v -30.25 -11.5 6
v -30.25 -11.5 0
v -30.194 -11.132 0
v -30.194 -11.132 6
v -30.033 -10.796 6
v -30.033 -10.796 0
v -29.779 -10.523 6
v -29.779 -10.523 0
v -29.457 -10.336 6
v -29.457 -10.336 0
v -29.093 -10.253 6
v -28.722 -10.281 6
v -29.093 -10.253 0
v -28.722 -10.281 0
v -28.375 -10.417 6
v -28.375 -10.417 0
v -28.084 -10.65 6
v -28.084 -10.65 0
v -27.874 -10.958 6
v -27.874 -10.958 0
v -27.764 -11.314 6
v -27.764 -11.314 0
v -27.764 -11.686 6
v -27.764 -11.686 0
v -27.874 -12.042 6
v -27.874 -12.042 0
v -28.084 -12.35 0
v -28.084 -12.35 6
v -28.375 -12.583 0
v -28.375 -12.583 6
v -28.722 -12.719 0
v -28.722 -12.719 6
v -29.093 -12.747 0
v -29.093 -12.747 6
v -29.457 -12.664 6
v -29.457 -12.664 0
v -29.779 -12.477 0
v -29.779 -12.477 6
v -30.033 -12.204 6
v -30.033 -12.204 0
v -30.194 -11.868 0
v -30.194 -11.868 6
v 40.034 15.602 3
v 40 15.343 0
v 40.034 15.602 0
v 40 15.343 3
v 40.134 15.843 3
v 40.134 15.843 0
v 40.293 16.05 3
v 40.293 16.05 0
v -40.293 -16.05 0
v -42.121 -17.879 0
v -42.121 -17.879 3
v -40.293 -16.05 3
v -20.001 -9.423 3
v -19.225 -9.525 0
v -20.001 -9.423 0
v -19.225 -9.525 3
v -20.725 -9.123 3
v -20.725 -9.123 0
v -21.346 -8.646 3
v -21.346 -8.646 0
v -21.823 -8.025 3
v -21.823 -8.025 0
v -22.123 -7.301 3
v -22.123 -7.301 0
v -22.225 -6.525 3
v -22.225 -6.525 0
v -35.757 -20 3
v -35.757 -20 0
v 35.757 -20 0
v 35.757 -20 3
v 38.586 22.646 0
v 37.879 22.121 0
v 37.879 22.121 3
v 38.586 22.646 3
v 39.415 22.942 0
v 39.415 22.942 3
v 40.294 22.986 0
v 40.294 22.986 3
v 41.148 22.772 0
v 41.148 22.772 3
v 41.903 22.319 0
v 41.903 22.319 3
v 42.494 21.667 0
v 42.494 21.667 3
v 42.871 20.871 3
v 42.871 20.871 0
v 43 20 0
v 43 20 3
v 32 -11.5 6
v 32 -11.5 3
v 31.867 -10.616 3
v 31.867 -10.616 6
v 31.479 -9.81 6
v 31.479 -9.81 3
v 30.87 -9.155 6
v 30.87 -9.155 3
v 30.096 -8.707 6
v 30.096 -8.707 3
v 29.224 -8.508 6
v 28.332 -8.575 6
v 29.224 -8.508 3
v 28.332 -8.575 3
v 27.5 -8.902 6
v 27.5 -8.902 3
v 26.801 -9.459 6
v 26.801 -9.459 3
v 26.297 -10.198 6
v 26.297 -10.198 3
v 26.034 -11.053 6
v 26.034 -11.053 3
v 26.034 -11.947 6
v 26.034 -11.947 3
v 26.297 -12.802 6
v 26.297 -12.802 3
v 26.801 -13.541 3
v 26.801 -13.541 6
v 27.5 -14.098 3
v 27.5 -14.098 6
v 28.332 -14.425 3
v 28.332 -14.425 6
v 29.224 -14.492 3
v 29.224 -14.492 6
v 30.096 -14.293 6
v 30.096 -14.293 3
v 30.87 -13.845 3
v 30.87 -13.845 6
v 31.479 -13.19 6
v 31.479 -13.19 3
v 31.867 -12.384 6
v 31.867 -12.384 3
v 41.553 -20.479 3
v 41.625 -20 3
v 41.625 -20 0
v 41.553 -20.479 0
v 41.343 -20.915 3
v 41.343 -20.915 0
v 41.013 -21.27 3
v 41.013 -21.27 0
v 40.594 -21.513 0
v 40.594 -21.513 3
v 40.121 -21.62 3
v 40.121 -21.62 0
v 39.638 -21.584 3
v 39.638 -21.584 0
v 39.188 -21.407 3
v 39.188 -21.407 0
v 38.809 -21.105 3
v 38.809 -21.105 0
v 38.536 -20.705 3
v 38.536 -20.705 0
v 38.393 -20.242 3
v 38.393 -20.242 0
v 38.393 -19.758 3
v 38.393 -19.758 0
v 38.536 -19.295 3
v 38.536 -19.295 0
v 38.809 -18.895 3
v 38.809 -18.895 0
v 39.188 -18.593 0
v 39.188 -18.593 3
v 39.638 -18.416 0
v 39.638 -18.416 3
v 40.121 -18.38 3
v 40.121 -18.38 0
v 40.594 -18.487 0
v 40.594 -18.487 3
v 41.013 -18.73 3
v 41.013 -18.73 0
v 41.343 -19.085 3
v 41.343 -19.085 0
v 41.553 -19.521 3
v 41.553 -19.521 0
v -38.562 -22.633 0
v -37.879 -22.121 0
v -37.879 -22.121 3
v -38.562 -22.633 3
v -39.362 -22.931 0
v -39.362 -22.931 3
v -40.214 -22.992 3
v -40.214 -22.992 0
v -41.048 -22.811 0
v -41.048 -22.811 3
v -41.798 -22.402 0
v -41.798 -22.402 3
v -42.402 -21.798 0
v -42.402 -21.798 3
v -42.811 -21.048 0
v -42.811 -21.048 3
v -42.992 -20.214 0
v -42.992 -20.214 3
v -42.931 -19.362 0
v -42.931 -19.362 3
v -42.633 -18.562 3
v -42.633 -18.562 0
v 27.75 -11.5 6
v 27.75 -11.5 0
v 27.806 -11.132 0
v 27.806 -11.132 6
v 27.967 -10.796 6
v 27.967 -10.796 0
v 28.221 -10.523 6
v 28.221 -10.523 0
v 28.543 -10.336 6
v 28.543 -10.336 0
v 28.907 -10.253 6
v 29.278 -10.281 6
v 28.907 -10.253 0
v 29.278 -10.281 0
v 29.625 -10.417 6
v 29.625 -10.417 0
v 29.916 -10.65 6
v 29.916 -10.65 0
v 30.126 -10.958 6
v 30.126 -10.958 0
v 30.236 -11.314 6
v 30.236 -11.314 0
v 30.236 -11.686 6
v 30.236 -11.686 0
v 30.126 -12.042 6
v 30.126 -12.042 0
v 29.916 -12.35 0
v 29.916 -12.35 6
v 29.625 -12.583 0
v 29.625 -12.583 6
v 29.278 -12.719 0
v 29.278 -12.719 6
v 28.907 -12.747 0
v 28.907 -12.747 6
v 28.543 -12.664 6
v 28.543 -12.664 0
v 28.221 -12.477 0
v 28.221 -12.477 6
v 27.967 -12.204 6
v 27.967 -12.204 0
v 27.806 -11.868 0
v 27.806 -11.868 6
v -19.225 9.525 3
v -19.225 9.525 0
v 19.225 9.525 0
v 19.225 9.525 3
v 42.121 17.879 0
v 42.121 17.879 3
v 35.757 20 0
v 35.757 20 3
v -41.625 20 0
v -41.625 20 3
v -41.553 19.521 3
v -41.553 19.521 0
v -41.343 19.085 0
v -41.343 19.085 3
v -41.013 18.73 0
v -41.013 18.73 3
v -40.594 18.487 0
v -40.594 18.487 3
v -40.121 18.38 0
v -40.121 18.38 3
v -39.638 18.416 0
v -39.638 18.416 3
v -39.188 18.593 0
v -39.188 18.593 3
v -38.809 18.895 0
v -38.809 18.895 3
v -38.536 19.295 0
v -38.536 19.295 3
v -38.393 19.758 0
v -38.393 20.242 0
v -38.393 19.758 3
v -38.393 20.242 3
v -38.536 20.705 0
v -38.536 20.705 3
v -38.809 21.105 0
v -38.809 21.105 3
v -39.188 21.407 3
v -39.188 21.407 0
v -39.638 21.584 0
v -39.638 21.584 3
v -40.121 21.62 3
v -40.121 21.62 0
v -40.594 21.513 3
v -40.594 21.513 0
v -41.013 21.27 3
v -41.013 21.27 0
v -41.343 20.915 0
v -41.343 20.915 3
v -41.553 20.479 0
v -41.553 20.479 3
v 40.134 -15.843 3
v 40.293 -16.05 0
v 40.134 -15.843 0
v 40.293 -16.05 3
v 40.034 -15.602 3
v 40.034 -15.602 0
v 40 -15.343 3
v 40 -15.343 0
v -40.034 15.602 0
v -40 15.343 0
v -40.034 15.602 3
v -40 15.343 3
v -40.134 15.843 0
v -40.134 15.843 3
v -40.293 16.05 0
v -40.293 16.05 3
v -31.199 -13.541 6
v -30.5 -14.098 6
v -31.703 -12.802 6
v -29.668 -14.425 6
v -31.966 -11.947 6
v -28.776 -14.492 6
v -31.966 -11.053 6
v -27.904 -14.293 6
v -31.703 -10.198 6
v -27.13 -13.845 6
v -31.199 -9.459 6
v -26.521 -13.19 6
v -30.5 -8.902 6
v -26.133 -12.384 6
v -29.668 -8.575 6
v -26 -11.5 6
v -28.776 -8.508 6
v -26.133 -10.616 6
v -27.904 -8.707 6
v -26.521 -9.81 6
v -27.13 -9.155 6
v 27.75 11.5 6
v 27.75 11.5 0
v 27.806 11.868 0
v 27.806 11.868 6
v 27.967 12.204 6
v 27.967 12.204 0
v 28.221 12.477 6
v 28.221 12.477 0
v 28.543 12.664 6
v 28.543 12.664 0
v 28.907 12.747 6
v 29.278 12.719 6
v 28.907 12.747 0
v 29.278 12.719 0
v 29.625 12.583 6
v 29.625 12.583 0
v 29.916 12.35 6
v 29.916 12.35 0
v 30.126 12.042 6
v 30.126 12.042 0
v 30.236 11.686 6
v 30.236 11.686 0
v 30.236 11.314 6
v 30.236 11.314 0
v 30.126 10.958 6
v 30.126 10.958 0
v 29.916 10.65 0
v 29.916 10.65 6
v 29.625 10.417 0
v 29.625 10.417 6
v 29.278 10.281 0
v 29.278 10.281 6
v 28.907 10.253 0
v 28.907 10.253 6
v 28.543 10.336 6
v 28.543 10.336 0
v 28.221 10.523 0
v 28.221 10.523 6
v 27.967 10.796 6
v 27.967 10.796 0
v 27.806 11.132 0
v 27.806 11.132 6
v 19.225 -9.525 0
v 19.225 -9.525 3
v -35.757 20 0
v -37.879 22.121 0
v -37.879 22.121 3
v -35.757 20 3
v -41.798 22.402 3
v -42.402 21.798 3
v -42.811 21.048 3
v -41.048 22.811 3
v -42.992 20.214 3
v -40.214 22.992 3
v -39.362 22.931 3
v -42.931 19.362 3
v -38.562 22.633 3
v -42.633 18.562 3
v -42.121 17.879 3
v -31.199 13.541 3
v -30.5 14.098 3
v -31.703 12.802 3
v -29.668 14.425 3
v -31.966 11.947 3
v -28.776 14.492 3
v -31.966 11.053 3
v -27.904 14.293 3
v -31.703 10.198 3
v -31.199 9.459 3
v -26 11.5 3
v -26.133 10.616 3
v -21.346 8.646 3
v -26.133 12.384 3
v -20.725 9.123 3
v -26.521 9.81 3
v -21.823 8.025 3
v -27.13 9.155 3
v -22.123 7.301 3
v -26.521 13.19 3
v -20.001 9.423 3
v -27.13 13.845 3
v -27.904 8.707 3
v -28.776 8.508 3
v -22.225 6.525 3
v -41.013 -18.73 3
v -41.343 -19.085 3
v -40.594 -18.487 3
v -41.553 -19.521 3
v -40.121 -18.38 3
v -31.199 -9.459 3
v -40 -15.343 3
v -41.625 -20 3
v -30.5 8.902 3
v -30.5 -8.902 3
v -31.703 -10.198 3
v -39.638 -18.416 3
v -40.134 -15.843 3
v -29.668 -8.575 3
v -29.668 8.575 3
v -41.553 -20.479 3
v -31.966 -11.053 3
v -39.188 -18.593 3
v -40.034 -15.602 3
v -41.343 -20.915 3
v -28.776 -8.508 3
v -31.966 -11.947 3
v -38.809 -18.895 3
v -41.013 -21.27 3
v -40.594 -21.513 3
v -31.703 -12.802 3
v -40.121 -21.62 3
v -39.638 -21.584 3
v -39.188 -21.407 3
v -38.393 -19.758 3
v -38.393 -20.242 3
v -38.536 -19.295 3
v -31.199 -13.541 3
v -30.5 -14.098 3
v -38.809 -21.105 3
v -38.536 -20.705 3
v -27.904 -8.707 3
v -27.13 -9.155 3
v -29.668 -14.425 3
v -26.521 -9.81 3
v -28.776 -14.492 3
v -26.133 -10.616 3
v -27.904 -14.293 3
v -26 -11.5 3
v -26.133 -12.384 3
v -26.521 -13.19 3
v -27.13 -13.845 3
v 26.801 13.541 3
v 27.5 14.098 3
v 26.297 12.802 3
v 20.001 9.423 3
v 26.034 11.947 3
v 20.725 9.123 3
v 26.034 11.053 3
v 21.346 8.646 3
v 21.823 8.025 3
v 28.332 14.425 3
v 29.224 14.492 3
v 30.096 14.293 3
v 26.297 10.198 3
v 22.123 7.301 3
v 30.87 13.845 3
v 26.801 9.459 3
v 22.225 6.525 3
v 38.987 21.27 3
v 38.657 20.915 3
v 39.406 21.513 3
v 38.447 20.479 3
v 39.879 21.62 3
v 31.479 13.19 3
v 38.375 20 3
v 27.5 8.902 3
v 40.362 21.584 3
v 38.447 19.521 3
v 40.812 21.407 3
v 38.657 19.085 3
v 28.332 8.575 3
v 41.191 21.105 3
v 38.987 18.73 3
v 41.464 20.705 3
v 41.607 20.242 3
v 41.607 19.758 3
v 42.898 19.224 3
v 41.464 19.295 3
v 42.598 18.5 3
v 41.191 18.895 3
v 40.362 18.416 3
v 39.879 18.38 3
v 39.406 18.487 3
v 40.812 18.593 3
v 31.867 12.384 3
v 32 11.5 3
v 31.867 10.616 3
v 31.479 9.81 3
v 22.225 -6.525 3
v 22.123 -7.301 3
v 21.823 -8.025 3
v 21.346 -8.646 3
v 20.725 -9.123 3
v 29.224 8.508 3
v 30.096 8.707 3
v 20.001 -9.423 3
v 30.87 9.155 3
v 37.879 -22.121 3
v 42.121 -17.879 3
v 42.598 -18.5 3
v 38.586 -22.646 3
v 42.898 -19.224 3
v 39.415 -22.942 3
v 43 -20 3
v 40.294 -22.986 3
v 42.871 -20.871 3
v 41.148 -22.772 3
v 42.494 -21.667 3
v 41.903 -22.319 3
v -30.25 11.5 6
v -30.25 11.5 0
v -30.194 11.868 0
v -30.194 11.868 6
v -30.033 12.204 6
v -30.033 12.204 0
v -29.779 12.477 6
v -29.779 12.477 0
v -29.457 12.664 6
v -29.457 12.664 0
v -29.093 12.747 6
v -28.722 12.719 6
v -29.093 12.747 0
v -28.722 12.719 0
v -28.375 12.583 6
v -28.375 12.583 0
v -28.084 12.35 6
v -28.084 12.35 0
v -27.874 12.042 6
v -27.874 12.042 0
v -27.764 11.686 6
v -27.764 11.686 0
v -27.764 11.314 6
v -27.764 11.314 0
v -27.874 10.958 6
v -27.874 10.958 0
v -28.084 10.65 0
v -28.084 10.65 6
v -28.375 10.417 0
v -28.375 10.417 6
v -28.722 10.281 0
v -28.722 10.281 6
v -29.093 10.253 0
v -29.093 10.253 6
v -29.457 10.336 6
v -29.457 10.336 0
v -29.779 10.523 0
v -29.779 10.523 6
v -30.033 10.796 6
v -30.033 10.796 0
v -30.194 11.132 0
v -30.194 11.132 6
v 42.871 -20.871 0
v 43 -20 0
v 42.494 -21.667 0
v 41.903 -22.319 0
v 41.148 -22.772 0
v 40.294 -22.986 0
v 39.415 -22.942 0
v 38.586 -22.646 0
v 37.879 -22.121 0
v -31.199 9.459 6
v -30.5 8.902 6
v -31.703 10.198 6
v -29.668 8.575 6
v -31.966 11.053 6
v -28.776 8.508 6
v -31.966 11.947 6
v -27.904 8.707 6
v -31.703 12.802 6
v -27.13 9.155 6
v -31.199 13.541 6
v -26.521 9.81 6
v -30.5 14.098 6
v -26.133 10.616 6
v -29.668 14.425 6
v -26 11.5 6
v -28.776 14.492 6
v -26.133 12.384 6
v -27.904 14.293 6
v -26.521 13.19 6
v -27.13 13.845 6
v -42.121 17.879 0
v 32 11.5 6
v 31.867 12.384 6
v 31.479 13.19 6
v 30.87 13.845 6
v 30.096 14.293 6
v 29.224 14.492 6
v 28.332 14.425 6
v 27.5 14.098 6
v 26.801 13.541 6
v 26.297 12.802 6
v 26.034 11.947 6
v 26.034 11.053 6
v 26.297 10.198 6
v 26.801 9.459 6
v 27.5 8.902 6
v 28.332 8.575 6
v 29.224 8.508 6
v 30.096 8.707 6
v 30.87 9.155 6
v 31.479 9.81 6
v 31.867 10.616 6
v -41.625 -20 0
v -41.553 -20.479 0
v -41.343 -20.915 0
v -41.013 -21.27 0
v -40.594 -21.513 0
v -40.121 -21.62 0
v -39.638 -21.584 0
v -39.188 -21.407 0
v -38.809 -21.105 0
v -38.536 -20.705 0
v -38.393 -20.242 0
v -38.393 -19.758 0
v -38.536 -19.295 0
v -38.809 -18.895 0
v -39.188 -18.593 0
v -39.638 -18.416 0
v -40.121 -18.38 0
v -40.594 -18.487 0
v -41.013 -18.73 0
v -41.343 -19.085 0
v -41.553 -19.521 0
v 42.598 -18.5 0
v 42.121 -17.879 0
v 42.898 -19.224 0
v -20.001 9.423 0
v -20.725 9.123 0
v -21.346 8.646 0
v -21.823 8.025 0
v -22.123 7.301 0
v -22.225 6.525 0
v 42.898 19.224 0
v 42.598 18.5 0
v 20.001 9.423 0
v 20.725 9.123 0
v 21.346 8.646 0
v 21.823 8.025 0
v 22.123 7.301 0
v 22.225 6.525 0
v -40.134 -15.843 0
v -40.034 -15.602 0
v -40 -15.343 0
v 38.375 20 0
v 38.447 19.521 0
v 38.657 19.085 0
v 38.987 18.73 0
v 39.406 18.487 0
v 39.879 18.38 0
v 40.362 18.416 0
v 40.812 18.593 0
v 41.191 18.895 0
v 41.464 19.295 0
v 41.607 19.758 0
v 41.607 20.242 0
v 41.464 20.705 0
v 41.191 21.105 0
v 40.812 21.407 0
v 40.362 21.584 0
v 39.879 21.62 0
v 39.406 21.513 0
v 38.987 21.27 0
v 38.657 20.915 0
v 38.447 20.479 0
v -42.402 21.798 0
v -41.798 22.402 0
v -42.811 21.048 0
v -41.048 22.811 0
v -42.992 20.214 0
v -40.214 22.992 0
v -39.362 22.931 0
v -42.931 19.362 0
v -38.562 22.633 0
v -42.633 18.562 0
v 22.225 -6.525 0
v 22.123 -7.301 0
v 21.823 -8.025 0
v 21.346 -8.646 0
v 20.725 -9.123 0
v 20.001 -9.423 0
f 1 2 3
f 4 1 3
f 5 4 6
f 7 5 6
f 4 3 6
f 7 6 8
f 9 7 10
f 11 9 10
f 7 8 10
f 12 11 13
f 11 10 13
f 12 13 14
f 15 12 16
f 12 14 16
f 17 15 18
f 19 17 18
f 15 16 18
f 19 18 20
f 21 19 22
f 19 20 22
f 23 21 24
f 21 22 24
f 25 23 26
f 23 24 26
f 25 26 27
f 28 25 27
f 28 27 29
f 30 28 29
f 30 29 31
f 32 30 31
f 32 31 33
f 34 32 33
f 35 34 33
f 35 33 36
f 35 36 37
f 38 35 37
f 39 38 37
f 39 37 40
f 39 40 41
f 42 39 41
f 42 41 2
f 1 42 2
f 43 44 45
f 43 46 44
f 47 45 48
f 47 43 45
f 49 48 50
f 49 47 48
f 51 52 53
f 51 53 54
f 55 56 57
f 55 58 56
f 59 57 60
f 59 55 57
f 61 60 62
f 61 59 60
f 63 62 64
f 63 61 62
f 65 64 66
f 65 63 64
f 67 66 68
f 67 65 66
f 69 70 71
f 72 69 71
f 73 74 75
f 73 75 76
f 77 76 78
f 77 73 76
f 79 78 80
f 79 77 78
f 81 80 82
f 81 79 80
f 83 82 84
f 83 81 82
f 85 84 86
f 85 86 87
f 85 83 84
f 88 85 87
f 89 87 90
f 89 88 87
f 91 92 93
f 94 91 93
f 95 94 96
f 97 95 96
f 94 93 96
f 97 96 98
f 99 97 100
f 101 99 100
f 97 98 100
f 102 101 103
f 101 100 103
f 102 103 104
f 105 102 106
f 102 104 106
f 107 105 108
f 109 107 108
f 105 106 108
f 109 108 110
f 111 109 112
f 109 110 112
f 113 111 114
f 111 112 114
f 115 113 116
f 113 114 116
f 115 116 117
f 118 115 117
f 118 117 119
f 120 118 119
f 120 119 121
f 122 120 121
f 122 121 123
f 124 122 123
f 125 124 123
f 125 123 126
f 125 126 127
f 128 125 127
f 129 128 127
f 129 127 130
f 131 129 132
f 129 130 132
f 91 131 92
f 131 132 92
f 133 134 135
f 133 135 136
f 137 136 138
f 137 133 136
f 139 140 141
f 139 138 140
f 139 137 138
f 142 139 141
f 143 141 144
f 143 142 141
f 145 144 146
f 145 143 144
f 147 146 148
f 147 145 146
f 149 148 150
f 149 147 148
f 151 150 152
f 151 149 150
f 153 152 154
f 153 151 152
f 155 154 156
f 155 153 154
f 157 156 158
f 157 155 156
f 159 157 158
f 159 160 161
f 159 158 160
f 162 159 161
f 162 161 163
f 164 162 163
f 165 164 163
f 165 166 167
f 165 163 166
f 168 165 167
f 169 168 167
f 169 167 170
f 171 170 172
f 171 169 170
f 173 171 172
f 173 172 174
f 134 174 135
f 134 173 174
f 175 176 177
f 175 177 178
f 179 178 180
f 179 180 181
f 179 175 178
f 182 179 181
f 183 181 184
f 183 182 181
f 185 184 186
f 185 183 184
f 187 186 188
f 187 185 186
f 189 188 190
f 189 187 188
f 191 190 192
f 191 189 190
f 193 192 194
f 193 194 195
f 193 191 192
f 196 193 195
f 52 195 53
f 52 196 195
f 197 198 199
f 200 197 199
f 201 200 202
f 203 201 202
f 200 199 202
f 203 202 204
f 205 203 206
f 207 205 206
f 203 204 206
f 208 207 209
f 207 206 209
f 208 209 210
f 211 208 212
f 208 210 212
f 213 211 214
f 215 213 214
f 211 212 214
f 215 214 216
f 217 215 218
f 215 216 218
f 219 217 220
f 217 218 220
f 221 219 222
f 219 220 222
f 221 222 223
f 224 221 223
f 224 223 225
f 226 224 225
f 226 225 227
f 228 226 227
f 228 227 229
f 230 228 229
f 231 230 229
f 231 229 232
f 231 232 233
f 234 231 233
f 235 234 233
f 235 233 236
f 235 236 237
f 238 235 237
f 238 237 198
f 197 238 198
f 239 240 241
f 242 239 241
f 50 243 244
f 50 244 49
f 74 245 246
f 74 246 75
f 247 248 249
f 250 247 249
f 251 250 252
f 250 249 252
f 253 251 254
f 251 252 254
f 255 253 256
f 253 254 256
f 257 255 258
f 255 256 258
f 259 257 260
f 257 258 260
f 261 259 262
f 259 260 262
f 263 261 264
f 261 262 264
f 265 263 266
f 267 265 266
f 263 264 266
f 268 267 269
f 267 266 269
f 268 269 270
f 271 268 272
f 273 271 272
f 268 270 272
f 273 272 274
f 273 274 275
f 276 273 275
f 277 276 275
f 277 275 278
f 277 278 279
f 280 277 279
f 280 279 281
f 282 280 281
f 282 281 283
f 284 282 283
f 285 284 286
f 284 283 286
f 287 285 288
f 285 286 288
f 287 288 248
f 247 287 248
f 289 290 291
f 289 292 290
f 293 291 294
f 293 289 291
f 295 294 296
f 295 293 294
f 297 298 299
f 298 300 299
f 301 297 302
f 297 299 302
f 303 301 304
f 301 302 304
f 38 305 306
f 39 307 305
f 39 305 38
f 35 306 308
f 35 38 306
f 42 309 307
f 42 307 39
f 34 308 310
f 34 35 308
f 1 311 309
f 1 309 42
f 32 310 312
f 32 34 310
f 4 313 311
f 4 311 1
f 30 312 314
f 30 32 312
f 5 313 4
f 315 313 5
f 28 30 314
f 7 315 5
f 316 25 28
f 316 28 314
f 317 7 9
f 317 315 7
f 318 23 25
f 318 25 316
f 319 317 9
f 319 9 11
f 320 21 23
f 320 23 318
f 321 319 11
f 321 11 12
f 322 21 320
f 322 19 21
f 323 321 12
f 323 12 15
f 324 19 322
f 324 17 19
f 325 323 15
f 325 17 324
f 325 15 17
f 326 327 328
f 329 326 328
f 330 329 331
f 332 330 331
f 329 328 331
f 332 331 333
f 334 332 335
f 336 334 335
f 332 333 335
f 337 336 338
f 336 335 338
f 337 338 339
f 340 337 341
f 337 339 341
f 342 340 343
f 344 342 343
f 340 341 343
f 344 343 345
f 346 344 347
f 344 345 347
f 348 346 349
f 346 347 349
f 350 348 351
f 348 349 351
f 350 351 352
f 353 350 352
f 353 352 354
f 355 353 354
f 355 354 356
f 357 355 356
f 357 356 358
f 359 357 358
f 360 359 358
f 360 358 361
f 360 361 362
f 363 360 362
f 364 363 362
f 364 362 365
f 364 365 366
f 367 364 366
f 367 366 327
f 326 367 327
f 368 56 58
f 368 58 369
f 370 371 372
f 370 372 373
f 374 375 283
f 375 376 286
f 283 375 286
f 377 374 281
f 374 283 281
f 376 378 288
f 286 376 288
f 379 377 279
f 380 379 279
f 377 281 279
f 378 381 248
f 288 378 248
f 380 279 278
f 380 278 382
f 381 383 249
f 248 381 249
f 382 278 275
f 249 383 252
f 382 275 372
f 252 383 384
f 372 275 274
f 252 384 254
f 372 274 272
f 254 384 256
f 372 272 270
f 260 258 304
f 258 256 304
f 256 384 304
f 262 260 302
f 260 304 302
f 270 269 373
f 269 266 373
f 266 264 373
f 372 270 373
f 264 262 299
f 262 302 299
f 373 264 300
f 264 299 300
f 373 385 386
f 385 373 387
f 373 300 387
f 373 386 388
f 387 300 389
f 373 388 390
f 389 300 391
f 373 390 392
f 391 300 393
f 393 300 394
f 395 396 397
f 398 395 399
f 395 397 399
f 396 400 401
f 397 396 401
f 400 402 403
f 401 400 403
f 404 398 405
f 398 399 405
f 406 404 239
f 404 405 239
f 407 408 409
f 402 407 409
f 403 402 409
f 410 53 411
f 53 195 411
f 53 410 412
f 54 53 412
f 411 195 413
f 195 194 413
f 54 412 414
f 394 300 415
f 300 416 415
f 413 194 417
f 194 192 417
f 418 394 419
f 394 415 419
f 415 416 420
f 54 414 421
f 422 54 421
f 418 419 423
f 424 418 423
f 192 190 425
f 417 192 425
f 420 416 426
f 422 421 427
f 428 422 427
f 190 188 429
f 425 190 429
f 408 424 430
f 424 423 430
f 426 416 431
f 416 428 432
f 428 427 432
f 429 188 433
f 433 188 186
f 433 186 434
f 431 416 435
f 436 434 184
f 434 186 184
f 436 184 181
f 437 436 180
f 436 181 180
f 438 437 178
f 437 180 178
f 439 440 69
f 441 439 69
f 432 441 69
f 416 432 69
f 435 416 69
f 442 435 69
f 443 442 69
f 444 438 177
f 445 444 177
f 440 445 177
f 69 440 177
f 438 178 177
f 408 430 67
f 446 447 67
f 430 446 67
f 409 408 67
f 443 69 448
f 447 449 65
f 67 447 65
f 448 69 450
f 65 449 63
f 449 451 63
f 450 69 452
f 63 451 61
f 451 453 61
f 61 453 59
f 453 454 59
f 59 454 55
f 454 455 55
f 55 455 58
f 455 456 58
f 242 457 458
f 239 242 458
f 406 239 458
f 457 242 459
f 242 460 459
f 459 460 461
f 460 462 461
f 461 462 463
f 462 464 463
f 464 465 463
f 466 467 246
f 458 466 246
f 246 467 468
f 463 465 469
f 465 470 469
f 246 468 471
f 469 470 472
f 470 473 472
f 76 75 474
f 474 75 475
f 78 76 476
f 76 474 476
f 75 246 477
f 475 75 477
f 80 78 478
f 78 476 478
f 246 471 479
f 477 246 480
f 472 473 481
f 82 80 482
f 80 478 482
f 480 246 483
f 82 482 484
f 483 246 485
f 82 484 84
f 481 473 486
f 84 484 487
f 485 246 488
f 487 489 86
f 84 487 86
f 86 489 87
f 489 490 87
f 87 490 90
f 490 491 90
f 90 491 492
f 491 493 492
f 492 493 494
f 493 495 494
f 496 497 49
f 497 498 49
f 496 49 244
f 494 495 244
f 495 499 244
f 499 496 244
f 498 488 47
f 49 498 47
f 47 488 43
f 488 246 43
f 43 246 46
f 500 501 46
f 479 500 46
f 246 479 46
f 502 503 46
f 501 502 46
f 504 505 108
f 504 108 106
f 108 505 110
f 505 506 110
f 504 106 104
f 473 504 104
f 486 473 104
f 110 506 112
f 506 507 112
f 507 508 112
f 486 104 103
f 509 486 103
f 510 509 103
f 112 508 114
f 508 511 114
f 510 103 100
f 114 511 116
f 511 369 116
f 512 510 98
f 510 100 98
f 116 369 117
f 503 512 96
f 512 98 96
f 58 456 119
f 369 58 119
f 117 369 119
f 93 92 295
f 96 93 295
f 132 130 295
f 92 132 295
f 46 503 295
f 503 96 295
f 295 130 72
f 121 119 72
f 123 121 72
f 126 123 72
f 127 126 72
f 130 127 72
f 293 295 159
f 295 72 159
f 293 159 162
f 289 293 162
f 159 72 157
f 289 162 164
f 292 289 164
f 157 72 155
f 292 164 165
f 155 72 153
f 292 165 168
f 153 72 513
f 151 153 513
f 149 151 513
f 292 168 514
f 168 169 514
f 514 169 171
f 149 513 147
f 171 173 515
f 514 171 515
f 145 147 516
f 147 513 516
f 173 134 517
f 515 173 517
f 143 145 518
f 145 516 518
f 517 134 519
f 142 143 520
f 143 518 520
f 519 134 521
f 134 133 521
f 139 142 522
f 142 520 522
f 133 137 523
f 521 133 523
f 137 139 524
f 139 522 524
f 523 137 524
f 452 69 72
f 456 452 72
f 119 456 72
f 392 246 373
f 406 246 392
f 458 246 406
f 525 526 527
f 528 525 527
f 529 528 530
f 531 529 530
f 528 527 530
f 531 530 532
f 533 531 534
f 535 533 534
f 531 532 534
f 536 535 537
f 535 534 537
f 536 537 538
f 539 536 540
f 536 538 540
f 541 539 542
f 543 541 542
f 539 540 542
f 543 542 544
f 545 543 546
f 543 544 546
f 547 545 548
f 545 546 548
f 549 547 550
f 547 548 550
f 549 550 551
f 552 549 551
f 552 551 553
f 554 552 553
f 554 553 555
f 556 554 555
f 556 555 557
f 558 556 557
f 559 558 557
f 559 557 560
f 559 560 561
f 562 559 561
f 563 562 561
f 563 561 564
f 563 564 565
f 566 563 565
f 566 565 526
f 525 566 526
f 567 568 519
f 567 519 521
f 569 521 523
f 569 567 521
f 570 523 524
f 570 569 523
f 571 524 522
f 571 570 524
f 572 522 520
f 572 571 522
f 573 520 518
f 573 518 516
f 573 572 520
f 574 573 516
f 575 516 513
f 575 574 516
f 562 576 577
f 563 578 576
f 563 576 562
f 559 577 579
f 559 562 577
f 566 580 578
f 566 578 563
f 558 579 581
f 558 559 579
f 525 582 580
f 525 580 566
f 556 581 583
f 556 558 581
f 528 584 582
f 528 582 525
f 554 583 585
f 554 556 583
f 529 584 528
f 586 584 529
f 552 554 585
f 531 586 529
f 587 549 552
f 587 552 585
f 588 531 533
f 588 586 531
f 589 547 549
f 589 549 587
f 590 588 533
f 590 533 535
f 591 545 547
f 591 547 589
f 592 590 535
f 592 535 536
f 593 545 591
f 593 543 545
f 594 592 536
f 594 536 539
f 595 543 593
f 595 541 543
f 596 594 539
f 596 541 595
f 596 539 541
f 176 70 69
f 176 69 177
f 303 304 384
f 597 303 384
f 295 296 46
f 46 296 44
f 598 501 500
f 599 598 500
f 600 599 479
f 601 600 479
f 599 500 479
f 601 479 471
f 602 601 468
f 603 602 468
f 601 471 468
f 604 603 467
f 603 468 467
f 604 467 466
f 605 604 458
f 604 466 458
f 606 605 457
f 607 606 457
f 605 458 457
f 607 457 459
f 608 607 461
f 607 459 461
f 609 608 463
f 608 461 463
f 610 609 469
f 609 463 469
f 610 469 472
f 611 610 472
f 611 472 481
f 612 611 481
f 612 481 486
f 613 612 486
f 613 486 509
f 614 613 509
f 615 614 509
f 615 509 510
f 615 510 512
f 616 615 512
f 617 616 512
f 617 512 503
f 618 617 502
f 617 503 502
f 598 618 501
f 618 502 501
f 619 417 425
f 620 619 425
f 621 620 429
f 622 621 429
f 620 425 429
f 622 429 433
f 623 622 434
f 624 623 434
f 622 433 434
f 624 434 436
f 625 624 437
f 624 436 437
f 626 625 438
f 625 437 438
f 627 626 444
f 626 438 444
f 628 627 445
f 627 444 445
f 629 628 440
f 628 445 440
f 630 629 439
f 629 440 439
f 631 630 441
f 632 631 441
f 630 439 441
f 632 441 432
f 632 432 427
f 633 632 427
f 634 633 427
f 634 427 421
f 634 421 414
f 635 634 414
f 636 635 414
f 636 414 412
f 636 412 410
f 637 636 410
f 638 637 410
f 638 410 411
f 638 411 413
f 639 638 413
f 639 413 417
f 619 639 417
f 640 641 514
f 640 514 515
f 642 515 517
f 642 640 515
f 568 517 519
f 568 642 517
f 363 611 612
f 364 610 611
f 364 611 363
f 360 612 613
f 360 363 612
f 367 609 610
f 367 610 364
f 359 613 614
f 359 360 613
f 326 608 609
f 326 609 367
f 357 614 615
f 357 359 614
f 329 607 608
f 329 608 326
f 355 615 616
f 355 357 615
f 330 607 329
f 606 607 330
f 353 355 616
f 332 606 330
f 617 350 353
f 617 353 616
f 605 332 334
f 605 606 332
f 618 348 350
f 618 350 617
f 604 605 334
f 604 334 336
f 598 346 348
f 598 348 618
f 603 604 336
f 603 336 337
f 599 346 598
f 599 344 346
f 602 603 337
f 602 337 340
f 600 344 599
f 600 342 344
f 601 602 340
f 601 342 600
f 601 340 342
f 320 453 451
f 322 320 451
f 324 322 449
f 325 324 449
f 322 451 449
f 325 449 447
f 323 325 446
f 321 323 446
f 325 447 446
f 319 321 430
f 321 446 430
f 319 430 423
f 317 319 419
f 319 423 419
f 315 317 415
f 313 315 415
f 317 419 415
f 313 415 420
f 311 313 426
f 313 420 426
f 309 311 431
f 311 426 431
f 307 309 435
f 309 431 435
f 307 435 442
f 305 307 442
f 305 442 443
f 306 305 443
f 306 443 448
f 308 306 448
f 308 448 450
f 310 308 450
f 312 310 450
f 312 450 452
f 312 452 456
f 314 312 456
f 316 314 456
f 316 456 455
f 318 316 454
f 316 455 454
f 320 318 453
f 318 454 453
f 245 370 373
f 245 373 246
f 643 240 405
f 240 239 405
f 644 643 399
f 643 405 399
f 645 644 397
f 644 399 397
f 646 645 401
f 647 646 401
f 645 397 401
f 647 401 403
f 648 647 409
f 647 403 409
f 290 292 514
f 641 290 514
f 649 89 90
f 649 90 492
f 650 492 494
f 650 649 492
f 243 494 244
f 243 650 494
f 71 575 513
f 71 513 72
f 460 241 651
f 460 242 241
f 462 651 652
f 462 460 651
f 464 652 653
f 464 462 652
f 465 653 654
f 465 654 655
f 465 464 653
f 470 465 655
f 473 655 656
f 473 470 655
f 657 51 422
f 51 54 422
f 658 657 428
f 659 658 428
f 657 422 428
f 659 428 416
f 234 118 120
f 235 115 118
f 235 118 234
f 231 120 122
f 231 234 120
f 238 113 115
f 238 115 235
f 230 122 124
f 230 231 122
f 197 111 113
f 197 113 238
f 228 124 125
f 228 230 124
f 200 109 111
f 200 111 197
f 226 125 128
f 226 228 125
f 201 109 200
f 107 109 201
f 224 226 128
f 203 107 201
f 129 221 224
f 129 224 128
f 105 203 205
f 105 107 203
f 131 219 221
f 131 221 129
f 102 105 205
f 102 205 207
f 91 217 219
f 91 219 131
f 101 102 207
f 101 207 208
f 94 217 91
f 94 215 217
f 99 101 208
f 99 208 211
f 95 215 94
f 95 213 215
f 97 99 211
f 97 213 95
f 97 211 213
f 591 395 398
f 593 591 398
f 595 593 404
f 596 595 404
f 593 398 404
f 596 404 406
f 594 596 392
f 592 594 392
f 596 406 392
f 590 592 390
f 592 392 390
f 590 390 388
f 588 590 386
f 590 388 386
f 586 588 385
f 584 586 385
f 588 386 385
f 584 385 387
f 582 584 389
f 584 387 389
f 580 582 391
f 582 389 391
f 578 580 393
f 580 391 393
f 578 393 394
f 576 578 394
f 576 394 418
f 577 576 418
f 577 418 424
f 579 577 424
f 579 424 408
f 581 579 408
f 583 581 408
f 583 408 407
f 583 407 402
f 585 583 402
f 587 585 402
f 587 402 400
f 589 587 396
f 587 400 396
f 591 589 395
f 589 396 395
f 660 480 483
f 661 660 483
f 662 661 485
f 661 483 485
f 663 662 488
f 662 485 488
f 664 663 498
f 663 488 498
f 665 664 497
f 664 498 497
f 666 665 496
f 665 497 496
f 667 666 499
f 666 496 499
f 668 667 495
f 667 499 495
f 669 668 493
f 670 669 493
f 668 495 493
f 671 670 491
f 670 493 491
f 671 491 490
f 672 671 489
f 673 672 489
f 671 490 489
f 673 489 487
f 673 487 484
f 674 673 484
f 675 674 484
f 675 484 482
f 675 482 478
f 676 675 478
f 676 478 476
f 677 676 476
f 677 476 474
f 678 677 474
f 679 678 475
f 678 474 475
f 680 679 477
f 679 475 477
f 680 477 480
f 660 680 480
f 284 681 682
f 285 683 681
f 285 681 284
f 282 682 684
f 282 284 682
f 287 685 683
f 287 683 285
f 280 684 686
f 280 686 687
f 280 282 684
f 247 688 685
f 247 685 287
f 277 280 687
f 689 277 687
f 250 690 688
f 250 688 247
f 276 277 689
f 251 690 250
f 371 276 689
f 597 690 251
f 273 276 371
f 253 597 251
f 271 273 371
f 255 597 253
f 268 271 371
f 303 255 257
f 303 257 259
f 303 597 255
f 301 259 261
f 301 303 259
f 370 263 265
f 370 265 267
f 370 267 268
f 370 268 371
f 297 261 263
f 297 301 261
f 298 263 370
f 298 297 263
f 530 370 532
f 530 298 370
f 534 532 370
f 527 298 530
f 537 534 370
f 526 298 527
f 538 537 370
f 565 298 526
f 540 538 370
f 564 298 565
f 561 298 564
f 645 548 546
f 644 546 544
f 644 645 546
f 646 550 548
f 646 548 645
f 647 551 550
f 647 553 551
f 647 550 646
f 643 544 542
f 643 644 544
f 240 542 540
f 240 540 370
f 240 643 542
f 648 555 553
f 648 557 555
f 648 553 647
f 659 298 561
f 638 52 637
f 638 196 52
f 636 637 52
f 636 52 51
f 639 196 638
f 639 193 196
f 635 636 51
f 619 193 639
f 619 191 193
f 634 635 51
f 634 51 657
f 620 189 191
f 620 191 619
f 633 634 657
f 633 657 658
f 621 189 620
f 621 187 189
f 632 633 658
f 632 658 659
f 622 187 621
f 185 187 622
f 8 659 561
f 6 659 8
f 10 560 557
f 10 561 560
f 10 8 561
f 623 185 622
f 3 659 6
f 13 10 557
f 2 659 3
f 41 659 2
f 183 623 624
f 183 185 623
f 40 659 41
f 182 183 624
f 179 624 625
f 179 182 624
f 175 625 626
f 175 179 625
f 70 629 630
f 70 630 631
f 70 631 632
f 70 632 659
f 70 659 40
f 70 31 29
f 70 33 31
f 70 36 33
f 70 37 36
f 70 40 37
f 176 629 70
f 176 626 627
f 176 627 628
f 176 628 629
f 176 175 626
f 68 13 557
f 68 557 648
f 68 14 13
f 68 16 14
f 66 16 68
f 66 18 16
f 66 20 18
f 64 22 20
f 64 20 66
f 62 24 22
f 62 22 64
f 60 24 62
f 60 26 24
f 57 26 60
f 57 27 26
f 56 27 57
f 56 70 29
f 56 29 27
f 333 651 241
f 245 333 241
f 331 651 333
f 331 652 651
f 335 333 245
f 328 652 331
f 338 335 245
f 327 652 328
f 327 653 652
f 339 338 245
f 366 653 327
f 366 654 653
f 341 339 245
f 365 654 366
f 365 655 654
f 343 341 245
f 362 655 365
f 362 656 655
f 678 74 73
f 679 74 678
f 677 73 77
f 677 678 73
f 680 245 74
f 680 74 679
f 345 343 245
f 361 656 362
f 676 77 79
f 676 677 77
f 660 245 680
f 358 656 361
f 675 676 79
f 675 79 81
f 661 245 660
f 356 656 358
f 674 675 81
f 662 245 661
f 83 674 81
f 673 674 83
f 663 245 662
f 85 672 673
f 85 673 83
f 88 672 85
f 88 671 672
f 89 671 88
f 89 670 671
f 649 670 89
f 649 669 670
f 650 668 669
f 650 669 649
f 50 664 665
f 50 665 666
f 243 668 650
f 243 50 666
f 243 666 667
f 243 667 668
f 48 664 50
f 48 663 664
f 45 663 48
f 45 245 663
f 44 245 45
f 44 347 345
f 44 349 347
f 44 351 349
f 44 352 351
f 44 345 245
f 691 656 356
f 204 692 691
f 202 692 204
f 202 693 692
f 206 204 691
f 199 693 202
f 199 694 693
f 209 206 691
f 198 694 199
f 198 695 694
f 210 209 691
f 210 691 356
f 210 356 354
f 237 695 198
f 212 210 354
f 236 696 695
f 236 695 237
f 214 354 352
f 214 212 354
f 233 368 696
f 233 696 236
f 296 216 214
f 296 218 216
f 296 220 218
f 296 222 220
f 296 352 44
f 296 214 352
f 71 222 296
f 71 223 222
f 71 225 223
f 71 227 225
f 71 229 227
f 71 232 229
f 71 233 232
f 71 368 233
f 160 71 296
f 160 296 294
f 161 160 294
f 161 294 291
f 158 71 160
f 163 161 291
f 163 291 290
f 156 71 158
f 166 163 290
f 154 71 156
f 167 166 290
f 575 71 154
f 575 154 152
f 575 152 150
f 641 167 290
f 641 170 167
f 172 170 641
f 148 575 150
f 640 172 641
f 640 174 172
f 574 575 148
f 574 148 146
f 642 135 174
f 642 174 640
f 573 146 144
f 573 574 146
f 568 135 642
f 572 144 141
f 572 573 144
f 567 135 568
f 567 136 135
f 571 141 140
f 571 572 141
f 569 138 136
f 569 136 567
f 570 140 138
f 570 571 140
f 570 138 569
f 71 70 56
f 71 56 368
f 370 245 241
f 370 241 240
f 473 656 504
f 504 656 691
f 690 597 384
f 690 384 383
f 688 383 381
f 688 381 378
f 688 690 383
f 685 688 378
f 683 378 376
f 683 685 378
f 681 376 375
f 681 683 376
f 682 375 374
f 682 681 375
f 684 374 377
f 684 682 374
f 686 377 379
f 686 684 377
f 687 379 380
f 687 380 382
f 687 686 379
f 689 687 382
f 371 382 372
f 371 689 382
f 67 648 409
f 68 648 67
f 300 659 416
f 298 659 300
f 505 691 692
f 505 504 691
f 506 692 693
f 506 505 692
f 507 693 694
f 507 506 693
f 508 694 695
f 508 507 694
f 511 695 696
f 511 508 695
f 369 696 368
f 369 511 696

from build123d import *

# Parameters (mm, degrees)
F0_W      = 80
F0_H      = 40
F1_DEPTH  = 3
F2_R      = 3
F3_DEPTH  = 3
F5_D      = 2.5
F7_DEPTH  = 3
F9_D      = 3.25
F10_W     = 44.45
F10_H     = 19.05
F11_DEPTH = 6.001
F12_R     = 3
F13_R     = 1


# Not quite as in the source:
# - a pattern or mirror of a feature is missing from the dataset's text; its kind, count and spacing are read off the source's solid
# - a feature names something its author has since deleted; it is built from what else it names


with BuildPart() as f1:
    # F0 (on Top) → F1 (new body)
    with BuildSketch(Plane.XY):
        Rectangle(F0_W, F0_H)
    extrude(amount=F1_DEPTH)

    # F2 (on face) → F3 (join)
    with BuildSketch(Plane.XY.offset(3)):
        with Locations((-29, 11.5)):
            Circle(F2_R)
        with Locations((29, 11.5)):
            Circle(F2_R)
        with Locations((29, -11.5)):
            Circle(F2_R)
        with Locations((-29, -11.5)):
            Circle(F2_R)
    extrude(amount=F3_DEPTH)

    # F5 (through all)
    with Locations(Plane.XY.offset(6)):
        with Locations((-29, 11.5), (29, 11.5), (29, -11.5), (-29, -11.5)):
            Hole(F5_D / 2)

    # F6 (on face) → F7 (join)
    with BuildSketch(Plane(origin=(0, 0, 0), x_dir=(1, 0, 0), z_dir=(0, 0, -1))):
        with BuildLine():
            ThreePointArc((42.1213203436, 17.8786796564), (42.7716385975, 18.8519497029), (43, 20))
            ThreePointArc((43, 20), (41.1480502971, 22.7716385975), (37.8786796564, 22.1213203436))
            ThreePointArc((37.8786796564, 22.1213203436), (37.2283614025, 21.1480502971), (37, 20))
            Line((37, 20), (40, 20))
            Line((40, 20), (40, 17))
            ThreePointArc((40, 17), (41.1480502971, 17.2283614025), (42.1213203436, 17.8786796564))
        make_face()
        with BuildLine():
            ThreePointArc((37, 20), (37.2283614025, 21.1480502971), (37.8786796564, 22.1213203436))
            Line((37.8786796564, 22.1213203436), (35.7573593129, 20))
            Line((35.7573593129, 20), (37, 20))
        make_face()
        with BuildLine():
            Line((40, 15.7573593129), (42.1213203436, 17.8786796564))
            ThreePointArc((42.1213203436, 17.8786796564), (41.1480502971, 17.2283614025), (40, 17))
            Line((40, 17), (40, 15.7573593129))
        make_face()
        with BuildLine():
            Line((-37, 20), (-35.7573593129, 20))
            Line((-35.7573593129, 20), (-37.8786796564, 22.1213203436))
            ThreePointArc((-37.8786796564, 22.1213203436), (-37.2283614025, 21.1480502971), (-37, 20))
        make_face()
        with BuildLine():
            Line((42.1213203436, -17.8786796564), (40, -15.7573593129))
            Line((40, -15.7573593129), (40, -17))
            ThreePointArc((40, -17), (41.1480502971, -17.2283614025), (42.1213203436, -17.8786796564))
        make_face()
        with BuildLine():
            ThreePointArc((-37, 20), (-37.2283614025, 21.1480502971), (-37.8786796564, 22.1213203436))
            ThreePointArc((-37.8786796564, 22.1213203436), (-42.1213203436, 22.1213203436), (-42.1213203436, 17.8786796564))
            ThreePointArc((-42.1213203436, 17.8786796564), (-41.1480502971, 17.2283614025), (-40, 17))
            Line((-40, 17), (-40, 20))
            Line((-40, 20), (-37, 20))
        make_face()
        with BuildLine():
            ThreePointArc((43, -20), (42.7716385975, -18.8519497029), (42.1213203436, -17.8786796564))
            ThreePointArc((42.1213203436, -17.8786796564), (41.1480502971, -17.2283614025), (40, -17))
            Line((40, -17), (40, -20))
            Line((40, -20), (37, -20))
            ThreePointArc((37, -20), (37.2283614025, -21.1480502971), (37.8786796564, -22.1213203436))
            ThreePointArc((37.8786796564, -22.1213203436), (41.1480502971, -22.7716385975), (43, -20))
        make_face()
        with BuildLine():
            ThreePointArc((-40, 17), (-41.1480502971, 17.2283614025), (-42.1213203436, 17.8786796564))
            Line((-42.1213203436, 17.8786796564), (-40, 15.7573593129))
            Line((-40, 15.7573593129), (-40, 17))
        make_face()
        with BuildLine():
            ThreePointArc((37.8786796564, -22.1213203436), (37.2283614025, -21.1480502971), (37, -20))
            Line((37, -20), (35.7573593129, -20))
            Line((35.7573593129, -20), (37.8786796564, -22.1213203436))
        make_face()
        with BuildLine():
            Line((-40, -17), (-40, -15.7573593129))
            Line((-40, -15.7573593129), (-42.1213203436, -17.8786796564))
            ThreePointArc((-42.1213203436, -17.8786796564), (-41.1480502971, -17.2283614025), (-40, -17))
        make_face()
        with BuildLine():
            Line((-37.8786796564, -22.1213203436), (-35.7573593129, -20))
            Line((-35.7573593129, -20), (-37, -20))
            ThreePointArc((-37, -20), (-37.2283614025, -21.1480502971), (-37.8786796564, -22.1213203436))
        make_face()
        with BuildLine():
            ThreePointArc((-40, -17), (-41.1480502971, -17.2283614025), (-42.1213203436, -17.8786796564))
            ThreePointArc((-42.1213203436, -17.8786796564), (-42.1213203436, -22.1213203436), (-37.8786796564, -22.1213203436))
            ThreePointArc((-37.8786796564, -22.1213203436), (-37.2283614025, -21.1480502971), (-37, -20))
            Line((-37, -20), (-40, -20))
            Line((-40, -20), (-40, -17))
        make_face()
    extrude(amount=-F7_DEPTH)

    # F9 (through all)
    with Locations(Plane(origin=(0, 0, 0), x_dir=(1, 0, 0), z_dir=(0, 0, -1))):
        with Locations((-40, 20), (-40, -20), (40, -20)):
            f9 = Hole(F9_D / 2)

    # F9_copies: F9 across plane
    add(f9.mirror(Plane(origin=(0, 0, 0), x_dir=(0, 0, 1), z_dir=(1, 0, 0))), mode=Mode.SUBTRACT)

    # F10 (on face) → F11 (cut, through all)
    with BuildSketch(Plane(origin=(0, 0, 0), x_dir=(1, 0, 0), z_dir=(0, 0, -1))):
        Rectangle(F10_W, F10_H)
    extrude(amount=-F11_DEPTH, mode=Mode.SUBTRACT)

    # F12
    f12_edges = [f1.edges().sort_by_distance(p)[0] for p in [
        (-22.225, 9.525, 1.5),
        (22.225, -9.525, 1.5),
        (-22.225, -9.525, 1.5),
        (22.225, 9.525, 1.5),
    ]]
    fillet(f12_edges, radius=F12_R)

    # F13
    f13_edges = [f1.edges().sort_by_distance(p)[0] for p in [
        (40, 15.757359, 1.5),
        (-40, 15.757359, 1.5),
        (40, -15.757359, 1.5),
        (-40, -15.757359, 1.5),
    ]]
    fillet(f13_edges, radius=F13_R)


solid = f1.part
